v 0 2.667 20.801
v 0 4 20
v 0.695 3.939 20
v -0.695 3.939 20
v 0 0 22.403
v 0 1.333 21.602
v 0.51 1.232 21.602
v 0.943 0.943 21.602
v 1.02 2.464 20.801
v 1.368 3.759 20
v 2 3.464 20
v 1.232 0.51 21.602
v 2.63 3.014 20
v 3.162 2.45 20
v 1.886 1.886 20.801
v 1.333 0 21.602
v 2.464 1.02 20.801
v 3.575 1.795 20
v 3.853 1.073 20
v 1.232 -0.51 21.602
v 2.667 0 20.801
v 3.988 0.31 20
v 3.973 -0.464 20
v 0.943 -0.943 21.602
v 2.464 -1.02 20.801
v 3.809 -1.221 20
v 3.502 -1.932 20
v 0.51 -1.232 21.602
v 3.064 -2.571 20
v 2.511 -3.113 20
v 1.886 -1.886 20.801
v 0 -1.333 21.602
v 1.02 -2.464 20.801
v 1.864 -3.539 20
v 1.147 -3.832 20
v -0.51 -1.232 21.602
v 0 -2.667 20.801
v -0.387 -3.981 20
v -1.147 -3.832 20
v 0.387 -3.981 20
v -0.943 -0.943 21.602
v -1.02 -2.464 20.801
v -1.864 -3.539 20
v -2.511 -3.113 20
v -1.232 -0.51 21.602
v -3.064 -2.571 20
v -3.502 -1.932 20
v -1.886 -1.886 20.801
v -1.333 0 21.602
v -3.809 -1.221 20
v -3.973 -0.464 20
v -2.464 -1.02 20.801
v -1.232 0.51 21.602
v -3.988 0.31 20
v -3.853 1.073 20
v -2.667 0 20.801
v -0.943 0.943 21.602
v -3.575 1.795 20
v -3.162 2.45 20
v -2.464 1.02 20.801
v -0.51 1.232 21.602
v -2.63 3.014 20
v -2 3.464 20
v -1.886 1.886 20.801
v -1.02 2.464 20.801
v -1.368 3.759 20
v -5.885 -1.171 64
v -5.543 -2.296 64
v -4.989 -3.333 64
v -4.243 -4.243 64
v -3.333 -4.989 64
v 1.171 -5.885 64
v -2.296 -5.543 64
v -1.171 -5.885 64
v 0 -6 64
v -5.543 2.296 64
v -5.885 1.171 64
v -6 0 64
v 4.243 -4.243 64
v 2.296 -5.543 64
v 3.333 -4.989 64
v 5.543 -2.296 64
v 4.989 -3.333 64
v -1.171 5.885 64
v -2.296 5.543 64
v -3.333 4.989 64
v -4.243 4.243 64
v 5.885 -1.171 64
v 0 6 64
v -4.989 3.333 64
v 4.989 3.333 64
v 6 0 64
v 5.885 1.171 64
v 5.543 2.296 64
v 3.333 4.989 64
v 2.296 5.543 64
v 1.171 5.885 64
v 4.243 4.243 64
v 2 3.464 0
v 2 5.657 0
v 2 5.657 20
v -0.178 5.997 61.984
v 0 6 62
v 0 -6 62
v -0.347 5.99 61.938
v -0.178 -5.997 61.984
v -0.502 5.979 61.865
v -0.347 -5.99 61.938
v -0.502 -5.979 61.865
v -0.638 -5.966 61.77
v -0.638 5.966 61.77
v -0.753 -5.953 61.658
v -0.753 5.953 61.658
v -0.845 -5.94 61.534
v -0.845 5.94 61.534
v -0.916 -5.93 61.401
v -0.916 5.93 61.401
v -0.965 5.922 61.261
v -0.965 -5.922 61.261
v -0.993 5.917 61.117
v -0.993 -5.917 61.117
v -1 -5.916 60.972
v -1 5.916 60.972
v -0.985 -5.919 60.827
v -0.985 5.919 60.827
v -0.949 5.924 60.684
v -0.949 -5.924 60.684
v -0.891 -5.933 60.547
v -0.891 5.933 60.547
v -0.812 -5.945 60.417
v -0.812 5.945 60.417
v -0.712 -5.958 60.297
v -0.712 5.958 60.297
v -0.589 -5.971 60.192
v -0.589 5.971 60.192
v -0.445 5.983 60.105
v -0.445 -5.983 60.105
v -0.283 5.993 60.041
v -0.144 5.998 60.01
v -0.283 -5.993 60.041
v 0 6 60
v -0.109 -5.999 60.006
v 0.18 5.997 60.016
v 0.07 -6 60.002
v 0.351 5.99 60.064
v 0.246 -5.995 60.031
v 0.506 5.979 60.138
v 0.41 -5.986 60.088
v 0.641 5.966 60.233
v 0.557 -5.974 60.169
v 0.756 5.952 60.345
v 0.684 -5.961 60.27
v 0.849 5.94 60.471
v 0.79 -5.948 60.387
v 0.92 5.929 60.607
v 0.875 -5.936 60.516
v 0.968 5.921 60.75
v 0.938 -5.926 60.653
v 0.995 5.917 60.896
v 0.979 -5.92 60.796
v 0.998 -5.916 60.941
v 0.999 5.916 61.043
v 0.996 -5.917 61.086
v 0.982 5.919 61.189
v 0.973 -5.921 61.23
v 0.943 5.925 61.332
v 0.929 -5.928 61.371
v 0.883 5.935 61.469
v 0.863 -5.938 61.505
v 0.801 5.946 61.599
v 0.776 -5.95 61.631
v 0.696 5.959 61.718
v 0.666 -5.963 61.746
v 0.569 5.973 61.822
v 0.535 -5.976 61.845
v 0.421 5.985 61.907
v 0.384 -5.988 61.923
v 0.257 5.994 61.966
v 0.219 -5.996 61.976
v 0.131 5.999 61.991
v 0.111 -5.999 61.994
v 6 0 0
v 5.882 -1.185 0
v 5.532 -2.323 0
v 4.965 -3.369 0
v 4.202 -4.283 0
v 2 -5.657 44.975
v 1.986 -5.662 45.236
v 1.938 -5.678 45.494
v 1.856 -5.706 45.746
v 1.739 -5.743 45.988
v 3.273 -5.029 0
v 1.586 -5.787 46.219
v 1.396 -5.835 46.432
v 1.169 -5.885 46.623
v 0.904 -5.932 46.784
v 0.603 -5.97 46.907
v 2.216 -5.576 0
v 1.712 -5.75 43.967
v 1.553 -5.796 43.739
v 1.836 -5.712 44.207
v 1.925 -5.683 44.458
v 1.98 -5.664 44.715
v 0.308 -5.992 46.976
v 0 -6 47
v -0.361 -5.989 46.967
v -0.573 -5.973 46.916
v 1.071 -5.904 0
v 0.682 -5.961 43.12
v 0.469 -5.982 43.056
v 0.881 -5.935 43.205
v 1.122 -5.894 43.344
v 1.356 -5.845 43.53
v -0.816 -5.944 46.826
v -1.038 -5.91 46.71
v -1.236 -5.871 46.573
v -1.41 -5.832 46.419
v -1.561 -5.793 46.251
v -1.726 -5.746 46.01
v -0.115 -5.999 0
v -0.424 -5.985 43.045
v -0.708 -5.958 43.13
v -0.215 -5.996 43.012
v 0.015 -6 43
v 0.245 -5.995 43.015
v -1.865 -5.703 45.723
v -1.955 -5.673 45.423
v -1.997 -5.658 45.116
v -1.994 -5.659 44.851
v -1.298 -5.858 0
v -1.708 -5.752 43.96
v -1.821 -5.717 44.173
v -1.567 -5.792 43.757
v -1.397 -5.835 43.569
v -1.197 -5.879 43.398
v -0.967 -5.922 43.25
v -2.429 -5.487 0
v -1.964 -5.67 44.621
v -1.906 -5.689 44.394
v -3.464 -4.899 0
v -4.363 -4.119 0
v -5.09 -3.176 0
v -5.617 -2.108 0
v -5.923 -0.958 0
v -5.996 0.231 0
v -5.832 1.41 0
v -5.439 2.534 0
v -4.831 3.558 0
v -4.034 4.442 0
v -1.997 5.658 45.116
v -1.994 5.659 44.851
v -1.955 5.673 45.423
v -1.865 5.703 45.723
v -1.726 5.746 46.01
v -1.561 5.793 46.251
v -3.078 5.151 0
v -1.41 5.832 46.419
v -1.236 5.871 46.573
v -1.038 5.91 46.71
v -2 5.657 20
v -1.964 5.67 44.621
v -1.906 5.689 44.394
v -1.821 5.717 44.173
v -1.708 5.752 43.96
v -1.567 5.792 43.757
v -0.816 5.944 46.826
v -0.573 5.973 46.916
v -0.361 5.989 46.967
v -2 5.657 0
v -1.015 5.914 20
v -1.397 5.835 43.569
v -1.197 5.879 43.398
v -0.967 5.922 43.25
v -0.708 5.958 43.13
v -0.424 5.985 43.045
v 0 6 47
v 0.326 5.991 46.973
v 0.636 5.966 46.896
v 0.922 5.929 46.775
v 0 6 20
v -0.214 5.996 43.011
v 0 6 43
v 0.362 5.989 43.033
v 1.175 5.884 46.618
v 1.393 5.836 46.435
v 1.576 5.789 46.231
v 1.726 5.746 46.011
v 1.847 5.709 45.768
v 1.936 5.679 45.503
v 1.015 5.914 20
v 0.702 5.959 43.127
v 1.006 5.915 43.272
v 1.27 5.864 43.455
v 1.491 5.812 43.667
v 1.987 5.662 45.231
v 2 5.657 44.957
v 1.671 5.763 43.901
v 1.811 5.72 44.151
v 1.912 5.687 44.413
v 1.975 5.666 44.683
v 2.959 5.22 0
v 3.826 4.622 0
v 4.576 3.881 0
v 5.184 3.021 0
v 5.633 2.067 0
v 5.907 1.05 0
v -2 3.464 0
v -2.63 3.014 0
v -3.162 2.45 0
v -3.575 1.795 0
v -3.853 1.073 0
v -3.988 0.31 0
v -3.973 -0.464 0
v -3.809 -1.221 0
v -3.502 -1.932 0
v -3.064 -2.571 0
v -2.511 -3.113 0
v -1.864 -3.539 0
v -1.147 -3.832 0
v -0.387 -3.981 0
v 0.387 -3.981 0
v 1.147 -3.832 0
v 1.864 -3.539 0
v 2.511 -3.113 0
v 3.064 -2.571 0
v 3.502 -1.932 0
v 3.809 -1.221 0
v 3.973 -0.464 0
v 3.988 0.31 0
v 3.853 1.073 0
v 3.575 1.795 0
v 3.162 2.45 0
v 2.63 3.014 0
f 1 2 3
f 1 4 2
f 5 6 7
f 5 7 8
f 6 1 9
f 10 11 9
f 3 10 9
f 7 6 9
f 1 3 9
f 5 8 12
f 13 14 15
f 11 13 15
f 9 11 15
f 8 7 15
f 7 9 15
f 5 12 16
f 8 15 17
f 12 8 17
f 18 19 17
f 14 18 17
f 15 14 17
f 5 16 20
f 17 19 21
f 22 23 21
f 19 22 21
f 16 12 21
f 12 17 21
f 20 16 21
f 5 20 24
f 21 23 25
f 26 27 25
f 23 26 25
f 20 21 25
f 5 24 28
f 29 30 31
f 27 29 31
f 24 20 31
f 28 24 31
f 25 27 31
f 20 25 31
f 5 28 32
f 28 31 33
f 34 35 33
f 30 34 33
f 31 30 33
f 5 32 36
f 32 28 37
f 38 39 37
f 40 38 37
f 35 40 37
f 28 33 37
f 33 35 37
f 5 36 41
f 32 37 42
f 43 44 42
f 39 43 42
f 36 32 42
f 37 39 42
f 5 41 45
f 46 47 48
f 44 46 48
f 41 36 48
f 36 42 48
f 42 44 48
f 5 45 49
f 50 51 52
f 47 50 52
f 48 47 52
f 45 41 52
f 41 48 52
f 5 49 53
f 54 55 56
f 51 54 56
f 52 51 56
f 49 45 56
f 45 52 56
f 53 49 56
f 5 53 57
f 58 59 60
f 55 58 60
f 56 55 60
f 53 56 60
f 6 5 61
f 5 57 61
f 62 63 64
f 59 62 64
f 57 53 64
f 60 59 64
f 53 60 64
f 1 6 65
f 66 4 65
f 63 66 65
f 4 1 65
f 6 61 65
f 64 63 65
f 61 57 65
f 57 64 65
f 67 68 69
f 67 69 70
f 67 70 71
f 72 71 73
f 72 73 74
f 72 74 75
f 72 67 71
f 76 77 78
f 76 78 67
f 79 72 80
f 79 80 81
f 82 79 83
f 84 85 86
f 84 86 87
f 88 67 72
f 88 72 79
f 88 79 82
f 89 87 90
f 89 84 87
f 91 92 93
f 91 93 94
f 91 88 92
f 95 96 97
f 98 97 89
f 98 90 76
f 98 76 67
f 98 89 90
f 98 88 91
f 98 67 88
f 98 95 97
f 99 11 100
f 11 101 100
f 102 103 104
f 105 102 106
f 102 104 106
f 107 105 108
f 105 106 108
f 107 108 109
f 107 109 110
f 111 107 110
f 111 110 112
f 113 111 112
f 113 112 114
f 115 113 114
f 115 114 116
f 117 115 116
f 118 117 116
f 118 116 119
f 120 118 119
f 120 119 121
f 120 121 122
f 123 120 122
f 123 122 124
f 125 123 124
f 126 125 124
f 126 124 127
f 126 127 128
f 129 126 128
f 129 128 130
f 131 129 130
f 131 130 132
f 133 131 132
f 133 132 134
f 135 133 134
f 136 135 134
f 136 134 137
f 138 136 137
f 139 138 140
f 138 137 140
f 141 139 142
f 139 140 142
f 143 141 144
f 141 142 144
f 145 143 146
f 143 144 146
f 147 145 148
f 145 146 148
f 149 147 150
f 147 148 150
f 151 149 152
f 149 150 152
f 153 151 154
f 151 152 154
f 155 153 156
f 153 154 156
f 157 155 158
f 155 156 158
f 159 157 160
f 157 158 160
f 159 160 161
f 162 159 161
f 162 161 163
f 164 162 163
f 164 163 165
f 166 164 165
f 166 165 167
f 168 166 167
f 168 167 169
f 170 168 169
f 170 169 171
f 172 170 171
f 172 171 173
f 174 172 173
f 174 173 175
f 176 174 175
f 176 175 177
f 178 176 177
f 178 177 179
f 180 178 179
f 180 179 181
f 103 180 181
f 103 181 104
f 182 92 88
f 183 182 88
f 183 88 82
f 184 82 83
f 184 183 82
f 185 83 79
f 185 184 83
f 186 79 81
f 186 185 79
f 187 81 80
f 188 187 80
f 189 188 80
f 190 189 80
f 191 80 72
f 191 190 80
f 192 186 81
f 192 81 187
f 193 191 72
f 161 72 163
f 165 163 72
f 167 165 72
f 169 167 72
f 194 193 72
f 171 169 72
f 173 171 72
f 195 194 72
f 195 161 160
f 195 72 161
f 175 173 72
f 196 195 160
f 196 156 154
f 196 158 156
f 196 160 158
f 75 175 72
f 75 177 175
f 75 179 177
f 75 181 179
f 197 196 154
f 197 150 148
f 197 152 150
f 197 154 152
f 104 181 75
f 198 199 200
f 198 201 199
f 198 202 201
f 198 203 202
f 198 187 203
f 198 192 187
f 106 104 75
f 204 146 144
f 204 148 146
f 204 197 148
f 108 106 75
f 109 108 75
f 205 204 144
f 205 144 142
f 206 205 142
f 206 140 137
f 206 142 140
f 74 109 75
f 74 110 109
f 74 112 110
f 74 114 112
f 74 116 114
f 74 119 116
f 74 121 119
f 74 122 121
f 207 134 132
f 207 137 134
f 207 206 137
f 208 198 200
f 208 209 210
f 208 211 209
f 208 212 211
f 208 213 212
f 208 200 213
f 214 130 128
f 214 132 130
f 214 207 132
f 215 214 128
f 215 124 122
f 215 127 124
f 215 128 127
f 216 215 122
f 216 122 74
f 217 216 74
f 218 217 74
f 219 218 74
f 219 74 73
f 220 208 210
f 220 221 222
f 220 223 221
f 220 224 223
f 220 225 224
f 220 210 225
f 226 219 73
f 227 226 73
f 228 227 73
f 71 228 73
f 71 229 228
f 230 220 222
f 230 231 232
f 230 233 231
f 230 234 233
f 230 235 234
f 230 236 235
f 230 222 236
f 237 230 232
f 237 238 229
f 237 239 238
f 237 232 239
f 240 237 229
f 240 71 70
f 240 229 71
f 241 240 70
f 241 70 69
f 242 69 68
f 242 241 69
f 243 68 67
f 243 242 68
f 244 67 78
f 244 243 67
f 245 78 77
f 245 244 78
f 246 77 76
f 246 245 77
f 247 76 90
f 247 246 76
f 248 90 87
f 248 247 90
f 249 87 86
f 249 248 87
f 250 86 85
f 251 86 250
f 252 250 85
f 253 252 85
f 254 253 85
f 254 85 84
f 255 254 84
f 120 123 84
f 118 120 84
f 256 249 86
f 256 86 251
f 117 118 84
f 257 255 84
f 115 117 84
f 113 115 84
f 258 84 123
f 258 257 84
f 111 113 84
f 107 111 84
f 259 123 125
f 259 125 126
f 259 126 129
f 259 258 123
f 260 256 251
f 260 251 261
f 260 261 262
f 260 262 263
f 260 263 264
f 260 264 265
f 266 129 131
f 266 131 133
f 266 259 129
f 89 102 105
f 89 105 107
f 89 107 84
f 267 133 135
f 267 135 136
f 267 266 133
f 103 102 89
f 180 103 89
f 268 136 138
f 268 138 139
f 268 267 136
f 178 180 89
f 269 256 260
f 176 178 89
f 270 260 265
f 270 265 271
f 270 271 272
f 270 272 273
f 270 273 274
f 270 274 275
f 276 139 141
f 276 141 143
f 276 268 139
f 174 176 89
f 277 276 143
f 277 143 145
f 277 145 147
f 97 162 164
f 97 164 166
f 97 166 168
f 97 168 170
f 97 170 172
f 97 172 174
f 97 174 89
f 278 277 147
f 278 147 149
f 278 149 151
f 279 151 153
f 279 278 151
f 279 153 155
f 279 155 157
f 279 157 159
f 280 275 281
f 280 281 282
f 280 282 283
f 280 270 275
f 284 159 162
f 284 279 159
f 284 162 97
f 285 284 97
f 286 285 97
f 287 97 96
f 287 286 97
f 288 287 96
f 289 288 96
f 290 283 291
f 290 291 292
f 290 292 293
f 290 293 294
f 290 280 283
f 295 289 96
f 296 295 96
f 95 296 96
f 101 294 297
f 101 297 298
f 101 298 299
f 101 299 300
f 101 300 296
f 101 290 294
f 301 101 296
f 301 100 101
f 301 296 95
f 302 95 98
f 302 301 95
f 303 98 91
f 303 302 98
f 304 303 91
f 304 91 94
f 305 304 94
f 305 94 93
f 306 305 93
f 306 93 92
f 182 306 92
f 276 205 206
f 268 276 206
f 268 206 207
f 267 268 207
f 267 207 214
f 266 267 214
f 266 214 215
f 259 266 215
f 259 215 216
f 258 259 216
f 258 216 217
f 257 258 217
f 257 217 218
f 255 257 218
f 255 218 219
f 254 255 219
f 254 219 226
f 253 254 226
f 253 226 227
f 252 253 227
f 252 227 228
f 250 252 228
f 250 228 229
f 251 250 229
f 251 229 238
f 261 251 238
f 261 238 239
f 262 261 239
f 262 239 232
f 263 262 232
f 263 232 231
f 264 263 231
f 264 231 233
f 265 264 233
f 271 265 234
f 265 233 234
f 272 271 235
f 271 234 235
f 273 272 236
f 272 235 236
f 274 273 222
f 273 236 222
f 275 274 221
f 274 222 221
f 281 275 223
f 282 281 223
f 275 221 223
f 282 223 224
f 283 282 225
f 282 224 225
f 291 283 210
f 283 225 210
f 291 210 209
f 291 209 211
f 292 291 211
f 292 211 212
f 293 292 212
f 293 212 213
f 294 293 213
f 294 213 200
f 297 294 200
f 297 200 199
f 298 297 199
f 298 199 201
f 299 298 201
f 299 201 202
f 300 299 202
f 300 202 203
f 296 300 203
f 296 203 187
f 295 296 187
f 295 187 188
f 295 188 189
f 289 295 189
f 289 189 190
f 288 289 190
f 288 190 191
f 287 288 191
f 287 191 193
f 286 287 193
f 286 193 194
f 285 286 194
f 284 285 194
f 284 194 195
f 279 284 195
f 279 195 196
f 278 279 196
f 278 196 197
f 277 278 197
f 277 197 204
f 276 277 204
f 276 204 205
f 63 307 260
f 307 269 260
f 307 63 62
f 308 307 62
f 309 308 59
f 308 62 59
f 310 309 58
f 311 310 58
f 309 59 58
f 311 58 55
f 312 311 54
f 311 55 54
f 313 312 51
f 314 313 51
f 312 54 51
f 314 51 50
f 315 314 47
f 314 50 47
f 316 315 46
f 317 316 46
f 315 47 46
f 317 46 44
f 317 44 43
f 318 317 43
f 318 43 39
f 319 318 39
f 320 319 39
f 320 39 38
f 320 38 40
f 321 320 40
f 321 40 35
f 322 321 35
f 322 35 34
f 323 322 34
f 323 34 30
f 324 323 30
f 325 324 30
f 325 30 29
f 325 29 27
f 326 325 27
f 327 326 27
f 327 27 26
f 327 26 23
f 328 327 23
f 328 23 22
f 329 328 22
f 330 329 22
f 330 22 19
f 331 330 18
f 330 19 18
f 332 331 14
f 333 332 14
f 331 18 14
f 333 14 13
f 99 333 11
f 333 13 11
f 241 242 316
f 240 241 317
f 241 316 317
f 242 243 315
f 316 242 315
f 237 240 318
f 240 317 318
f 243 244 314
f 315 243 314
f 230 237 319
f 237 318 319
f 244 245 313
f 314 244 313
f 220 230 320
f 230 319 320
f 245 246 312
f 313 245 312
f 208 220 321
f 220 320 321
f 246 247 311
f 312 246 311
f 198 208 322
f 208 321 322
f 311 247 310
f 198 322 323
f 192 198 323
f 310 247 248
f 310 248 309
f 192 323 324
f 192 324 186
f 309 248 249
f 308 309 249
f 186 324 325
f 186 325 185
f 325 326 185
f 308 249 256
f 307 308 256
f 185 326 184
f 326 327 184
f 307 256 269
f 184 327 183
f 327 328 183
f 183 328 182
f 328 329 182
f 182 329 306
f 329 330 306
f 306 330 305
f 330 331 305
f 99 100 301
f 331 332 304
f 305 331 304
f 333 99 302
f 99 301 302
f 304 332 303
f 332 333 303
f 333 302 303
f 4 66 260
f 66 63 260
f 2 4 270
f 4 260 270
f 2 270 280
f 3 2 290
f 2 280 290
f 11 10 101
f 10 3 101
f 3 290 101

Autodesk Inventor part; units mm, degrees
ref_plane "YZ Plane" through (0, 0, 0) normal (1, 0, 0) x (0, 1, 0)
ref_plane "XY Plane" through (0, 0, 0) normal (0, 0, 1) x (1, 0, 0)
sketch "スケッチ1" plane through (0, 0, 0) normal (0, 0, 1) x (1, 0, 0)
  circle A0 centre (0, 0) radius 6
  dimension "d0" = 12
extrude "押し出し1" add sketch "スケッチ1" along normal blind 64
ref_plane "作業平面1" through (0, 6, 0) normal (0, 1, 0) x (-1, 0, 0)
sketch "スケッチ2" plane through (0, 6, 0) normal (0, 1, 0) x (-1, 0, 0)
  line L0 (0, 0) -> (2, 0)
  line L1 (2, 0) -> (2, 20)
  line L2 (2, 20) -> (0, 20)
  line L3 (0, 20) -> (0, 0)
  line L4 (6, 0) -> (-6, 0) projected
  line L5 (0, 20) -> (-2, 20)
  line L6 (-2, 20) -> (-2, 0)
  line L7 (-2, 0) -> (0, 0)
  line L8 (0, 0) -> (0, 20)
  dimension "d3" = 2
  dimension "d4" = 20
  dimension "d5" = 2
  dimension "d31" = 4
extrude "押し出し2" cut sketch "スケッチ2" against normal blind 6
sketch "スケッチ3" plane through (0, 0, 0) normal (0, 0, -1) x (-1, 0, 0)
  point P0 (0, 0)
  point P1 (0, 0)
hole "穴1" at (0, 0, 0) direction (0, 0, 1) diameter 8 depth 20 tip angle 118
sketch "スケッチ4" plane through (0, 6, 0) normal (0, 1, 0) x (-1, 0, 0)
  line L0 (2, 20) -> (-2, 20) projected
  point P0 (0, 0)
  point P1 (0, 45)
  dimension "d15" = 25
hole "穴2" at (0, 6, 45) direction (0, -1, 0) diameter 4 end through all
sketch "スケッチ5" plane through (0, 6, 0) normal (0, 1, 0) x (-1, 0, 0)
  line L0 (6, 64) -> (-6, 64) projected
  point P0 (0, 0)
  point P1 (0, 61)
  dimension "d23" = 3
hole "穴3" at (0, 6, 61) direction (0, -1, 0) diameter 2 end through all
properties part number "small_bar_motor" material "アルミニウム 6061-AHC"
